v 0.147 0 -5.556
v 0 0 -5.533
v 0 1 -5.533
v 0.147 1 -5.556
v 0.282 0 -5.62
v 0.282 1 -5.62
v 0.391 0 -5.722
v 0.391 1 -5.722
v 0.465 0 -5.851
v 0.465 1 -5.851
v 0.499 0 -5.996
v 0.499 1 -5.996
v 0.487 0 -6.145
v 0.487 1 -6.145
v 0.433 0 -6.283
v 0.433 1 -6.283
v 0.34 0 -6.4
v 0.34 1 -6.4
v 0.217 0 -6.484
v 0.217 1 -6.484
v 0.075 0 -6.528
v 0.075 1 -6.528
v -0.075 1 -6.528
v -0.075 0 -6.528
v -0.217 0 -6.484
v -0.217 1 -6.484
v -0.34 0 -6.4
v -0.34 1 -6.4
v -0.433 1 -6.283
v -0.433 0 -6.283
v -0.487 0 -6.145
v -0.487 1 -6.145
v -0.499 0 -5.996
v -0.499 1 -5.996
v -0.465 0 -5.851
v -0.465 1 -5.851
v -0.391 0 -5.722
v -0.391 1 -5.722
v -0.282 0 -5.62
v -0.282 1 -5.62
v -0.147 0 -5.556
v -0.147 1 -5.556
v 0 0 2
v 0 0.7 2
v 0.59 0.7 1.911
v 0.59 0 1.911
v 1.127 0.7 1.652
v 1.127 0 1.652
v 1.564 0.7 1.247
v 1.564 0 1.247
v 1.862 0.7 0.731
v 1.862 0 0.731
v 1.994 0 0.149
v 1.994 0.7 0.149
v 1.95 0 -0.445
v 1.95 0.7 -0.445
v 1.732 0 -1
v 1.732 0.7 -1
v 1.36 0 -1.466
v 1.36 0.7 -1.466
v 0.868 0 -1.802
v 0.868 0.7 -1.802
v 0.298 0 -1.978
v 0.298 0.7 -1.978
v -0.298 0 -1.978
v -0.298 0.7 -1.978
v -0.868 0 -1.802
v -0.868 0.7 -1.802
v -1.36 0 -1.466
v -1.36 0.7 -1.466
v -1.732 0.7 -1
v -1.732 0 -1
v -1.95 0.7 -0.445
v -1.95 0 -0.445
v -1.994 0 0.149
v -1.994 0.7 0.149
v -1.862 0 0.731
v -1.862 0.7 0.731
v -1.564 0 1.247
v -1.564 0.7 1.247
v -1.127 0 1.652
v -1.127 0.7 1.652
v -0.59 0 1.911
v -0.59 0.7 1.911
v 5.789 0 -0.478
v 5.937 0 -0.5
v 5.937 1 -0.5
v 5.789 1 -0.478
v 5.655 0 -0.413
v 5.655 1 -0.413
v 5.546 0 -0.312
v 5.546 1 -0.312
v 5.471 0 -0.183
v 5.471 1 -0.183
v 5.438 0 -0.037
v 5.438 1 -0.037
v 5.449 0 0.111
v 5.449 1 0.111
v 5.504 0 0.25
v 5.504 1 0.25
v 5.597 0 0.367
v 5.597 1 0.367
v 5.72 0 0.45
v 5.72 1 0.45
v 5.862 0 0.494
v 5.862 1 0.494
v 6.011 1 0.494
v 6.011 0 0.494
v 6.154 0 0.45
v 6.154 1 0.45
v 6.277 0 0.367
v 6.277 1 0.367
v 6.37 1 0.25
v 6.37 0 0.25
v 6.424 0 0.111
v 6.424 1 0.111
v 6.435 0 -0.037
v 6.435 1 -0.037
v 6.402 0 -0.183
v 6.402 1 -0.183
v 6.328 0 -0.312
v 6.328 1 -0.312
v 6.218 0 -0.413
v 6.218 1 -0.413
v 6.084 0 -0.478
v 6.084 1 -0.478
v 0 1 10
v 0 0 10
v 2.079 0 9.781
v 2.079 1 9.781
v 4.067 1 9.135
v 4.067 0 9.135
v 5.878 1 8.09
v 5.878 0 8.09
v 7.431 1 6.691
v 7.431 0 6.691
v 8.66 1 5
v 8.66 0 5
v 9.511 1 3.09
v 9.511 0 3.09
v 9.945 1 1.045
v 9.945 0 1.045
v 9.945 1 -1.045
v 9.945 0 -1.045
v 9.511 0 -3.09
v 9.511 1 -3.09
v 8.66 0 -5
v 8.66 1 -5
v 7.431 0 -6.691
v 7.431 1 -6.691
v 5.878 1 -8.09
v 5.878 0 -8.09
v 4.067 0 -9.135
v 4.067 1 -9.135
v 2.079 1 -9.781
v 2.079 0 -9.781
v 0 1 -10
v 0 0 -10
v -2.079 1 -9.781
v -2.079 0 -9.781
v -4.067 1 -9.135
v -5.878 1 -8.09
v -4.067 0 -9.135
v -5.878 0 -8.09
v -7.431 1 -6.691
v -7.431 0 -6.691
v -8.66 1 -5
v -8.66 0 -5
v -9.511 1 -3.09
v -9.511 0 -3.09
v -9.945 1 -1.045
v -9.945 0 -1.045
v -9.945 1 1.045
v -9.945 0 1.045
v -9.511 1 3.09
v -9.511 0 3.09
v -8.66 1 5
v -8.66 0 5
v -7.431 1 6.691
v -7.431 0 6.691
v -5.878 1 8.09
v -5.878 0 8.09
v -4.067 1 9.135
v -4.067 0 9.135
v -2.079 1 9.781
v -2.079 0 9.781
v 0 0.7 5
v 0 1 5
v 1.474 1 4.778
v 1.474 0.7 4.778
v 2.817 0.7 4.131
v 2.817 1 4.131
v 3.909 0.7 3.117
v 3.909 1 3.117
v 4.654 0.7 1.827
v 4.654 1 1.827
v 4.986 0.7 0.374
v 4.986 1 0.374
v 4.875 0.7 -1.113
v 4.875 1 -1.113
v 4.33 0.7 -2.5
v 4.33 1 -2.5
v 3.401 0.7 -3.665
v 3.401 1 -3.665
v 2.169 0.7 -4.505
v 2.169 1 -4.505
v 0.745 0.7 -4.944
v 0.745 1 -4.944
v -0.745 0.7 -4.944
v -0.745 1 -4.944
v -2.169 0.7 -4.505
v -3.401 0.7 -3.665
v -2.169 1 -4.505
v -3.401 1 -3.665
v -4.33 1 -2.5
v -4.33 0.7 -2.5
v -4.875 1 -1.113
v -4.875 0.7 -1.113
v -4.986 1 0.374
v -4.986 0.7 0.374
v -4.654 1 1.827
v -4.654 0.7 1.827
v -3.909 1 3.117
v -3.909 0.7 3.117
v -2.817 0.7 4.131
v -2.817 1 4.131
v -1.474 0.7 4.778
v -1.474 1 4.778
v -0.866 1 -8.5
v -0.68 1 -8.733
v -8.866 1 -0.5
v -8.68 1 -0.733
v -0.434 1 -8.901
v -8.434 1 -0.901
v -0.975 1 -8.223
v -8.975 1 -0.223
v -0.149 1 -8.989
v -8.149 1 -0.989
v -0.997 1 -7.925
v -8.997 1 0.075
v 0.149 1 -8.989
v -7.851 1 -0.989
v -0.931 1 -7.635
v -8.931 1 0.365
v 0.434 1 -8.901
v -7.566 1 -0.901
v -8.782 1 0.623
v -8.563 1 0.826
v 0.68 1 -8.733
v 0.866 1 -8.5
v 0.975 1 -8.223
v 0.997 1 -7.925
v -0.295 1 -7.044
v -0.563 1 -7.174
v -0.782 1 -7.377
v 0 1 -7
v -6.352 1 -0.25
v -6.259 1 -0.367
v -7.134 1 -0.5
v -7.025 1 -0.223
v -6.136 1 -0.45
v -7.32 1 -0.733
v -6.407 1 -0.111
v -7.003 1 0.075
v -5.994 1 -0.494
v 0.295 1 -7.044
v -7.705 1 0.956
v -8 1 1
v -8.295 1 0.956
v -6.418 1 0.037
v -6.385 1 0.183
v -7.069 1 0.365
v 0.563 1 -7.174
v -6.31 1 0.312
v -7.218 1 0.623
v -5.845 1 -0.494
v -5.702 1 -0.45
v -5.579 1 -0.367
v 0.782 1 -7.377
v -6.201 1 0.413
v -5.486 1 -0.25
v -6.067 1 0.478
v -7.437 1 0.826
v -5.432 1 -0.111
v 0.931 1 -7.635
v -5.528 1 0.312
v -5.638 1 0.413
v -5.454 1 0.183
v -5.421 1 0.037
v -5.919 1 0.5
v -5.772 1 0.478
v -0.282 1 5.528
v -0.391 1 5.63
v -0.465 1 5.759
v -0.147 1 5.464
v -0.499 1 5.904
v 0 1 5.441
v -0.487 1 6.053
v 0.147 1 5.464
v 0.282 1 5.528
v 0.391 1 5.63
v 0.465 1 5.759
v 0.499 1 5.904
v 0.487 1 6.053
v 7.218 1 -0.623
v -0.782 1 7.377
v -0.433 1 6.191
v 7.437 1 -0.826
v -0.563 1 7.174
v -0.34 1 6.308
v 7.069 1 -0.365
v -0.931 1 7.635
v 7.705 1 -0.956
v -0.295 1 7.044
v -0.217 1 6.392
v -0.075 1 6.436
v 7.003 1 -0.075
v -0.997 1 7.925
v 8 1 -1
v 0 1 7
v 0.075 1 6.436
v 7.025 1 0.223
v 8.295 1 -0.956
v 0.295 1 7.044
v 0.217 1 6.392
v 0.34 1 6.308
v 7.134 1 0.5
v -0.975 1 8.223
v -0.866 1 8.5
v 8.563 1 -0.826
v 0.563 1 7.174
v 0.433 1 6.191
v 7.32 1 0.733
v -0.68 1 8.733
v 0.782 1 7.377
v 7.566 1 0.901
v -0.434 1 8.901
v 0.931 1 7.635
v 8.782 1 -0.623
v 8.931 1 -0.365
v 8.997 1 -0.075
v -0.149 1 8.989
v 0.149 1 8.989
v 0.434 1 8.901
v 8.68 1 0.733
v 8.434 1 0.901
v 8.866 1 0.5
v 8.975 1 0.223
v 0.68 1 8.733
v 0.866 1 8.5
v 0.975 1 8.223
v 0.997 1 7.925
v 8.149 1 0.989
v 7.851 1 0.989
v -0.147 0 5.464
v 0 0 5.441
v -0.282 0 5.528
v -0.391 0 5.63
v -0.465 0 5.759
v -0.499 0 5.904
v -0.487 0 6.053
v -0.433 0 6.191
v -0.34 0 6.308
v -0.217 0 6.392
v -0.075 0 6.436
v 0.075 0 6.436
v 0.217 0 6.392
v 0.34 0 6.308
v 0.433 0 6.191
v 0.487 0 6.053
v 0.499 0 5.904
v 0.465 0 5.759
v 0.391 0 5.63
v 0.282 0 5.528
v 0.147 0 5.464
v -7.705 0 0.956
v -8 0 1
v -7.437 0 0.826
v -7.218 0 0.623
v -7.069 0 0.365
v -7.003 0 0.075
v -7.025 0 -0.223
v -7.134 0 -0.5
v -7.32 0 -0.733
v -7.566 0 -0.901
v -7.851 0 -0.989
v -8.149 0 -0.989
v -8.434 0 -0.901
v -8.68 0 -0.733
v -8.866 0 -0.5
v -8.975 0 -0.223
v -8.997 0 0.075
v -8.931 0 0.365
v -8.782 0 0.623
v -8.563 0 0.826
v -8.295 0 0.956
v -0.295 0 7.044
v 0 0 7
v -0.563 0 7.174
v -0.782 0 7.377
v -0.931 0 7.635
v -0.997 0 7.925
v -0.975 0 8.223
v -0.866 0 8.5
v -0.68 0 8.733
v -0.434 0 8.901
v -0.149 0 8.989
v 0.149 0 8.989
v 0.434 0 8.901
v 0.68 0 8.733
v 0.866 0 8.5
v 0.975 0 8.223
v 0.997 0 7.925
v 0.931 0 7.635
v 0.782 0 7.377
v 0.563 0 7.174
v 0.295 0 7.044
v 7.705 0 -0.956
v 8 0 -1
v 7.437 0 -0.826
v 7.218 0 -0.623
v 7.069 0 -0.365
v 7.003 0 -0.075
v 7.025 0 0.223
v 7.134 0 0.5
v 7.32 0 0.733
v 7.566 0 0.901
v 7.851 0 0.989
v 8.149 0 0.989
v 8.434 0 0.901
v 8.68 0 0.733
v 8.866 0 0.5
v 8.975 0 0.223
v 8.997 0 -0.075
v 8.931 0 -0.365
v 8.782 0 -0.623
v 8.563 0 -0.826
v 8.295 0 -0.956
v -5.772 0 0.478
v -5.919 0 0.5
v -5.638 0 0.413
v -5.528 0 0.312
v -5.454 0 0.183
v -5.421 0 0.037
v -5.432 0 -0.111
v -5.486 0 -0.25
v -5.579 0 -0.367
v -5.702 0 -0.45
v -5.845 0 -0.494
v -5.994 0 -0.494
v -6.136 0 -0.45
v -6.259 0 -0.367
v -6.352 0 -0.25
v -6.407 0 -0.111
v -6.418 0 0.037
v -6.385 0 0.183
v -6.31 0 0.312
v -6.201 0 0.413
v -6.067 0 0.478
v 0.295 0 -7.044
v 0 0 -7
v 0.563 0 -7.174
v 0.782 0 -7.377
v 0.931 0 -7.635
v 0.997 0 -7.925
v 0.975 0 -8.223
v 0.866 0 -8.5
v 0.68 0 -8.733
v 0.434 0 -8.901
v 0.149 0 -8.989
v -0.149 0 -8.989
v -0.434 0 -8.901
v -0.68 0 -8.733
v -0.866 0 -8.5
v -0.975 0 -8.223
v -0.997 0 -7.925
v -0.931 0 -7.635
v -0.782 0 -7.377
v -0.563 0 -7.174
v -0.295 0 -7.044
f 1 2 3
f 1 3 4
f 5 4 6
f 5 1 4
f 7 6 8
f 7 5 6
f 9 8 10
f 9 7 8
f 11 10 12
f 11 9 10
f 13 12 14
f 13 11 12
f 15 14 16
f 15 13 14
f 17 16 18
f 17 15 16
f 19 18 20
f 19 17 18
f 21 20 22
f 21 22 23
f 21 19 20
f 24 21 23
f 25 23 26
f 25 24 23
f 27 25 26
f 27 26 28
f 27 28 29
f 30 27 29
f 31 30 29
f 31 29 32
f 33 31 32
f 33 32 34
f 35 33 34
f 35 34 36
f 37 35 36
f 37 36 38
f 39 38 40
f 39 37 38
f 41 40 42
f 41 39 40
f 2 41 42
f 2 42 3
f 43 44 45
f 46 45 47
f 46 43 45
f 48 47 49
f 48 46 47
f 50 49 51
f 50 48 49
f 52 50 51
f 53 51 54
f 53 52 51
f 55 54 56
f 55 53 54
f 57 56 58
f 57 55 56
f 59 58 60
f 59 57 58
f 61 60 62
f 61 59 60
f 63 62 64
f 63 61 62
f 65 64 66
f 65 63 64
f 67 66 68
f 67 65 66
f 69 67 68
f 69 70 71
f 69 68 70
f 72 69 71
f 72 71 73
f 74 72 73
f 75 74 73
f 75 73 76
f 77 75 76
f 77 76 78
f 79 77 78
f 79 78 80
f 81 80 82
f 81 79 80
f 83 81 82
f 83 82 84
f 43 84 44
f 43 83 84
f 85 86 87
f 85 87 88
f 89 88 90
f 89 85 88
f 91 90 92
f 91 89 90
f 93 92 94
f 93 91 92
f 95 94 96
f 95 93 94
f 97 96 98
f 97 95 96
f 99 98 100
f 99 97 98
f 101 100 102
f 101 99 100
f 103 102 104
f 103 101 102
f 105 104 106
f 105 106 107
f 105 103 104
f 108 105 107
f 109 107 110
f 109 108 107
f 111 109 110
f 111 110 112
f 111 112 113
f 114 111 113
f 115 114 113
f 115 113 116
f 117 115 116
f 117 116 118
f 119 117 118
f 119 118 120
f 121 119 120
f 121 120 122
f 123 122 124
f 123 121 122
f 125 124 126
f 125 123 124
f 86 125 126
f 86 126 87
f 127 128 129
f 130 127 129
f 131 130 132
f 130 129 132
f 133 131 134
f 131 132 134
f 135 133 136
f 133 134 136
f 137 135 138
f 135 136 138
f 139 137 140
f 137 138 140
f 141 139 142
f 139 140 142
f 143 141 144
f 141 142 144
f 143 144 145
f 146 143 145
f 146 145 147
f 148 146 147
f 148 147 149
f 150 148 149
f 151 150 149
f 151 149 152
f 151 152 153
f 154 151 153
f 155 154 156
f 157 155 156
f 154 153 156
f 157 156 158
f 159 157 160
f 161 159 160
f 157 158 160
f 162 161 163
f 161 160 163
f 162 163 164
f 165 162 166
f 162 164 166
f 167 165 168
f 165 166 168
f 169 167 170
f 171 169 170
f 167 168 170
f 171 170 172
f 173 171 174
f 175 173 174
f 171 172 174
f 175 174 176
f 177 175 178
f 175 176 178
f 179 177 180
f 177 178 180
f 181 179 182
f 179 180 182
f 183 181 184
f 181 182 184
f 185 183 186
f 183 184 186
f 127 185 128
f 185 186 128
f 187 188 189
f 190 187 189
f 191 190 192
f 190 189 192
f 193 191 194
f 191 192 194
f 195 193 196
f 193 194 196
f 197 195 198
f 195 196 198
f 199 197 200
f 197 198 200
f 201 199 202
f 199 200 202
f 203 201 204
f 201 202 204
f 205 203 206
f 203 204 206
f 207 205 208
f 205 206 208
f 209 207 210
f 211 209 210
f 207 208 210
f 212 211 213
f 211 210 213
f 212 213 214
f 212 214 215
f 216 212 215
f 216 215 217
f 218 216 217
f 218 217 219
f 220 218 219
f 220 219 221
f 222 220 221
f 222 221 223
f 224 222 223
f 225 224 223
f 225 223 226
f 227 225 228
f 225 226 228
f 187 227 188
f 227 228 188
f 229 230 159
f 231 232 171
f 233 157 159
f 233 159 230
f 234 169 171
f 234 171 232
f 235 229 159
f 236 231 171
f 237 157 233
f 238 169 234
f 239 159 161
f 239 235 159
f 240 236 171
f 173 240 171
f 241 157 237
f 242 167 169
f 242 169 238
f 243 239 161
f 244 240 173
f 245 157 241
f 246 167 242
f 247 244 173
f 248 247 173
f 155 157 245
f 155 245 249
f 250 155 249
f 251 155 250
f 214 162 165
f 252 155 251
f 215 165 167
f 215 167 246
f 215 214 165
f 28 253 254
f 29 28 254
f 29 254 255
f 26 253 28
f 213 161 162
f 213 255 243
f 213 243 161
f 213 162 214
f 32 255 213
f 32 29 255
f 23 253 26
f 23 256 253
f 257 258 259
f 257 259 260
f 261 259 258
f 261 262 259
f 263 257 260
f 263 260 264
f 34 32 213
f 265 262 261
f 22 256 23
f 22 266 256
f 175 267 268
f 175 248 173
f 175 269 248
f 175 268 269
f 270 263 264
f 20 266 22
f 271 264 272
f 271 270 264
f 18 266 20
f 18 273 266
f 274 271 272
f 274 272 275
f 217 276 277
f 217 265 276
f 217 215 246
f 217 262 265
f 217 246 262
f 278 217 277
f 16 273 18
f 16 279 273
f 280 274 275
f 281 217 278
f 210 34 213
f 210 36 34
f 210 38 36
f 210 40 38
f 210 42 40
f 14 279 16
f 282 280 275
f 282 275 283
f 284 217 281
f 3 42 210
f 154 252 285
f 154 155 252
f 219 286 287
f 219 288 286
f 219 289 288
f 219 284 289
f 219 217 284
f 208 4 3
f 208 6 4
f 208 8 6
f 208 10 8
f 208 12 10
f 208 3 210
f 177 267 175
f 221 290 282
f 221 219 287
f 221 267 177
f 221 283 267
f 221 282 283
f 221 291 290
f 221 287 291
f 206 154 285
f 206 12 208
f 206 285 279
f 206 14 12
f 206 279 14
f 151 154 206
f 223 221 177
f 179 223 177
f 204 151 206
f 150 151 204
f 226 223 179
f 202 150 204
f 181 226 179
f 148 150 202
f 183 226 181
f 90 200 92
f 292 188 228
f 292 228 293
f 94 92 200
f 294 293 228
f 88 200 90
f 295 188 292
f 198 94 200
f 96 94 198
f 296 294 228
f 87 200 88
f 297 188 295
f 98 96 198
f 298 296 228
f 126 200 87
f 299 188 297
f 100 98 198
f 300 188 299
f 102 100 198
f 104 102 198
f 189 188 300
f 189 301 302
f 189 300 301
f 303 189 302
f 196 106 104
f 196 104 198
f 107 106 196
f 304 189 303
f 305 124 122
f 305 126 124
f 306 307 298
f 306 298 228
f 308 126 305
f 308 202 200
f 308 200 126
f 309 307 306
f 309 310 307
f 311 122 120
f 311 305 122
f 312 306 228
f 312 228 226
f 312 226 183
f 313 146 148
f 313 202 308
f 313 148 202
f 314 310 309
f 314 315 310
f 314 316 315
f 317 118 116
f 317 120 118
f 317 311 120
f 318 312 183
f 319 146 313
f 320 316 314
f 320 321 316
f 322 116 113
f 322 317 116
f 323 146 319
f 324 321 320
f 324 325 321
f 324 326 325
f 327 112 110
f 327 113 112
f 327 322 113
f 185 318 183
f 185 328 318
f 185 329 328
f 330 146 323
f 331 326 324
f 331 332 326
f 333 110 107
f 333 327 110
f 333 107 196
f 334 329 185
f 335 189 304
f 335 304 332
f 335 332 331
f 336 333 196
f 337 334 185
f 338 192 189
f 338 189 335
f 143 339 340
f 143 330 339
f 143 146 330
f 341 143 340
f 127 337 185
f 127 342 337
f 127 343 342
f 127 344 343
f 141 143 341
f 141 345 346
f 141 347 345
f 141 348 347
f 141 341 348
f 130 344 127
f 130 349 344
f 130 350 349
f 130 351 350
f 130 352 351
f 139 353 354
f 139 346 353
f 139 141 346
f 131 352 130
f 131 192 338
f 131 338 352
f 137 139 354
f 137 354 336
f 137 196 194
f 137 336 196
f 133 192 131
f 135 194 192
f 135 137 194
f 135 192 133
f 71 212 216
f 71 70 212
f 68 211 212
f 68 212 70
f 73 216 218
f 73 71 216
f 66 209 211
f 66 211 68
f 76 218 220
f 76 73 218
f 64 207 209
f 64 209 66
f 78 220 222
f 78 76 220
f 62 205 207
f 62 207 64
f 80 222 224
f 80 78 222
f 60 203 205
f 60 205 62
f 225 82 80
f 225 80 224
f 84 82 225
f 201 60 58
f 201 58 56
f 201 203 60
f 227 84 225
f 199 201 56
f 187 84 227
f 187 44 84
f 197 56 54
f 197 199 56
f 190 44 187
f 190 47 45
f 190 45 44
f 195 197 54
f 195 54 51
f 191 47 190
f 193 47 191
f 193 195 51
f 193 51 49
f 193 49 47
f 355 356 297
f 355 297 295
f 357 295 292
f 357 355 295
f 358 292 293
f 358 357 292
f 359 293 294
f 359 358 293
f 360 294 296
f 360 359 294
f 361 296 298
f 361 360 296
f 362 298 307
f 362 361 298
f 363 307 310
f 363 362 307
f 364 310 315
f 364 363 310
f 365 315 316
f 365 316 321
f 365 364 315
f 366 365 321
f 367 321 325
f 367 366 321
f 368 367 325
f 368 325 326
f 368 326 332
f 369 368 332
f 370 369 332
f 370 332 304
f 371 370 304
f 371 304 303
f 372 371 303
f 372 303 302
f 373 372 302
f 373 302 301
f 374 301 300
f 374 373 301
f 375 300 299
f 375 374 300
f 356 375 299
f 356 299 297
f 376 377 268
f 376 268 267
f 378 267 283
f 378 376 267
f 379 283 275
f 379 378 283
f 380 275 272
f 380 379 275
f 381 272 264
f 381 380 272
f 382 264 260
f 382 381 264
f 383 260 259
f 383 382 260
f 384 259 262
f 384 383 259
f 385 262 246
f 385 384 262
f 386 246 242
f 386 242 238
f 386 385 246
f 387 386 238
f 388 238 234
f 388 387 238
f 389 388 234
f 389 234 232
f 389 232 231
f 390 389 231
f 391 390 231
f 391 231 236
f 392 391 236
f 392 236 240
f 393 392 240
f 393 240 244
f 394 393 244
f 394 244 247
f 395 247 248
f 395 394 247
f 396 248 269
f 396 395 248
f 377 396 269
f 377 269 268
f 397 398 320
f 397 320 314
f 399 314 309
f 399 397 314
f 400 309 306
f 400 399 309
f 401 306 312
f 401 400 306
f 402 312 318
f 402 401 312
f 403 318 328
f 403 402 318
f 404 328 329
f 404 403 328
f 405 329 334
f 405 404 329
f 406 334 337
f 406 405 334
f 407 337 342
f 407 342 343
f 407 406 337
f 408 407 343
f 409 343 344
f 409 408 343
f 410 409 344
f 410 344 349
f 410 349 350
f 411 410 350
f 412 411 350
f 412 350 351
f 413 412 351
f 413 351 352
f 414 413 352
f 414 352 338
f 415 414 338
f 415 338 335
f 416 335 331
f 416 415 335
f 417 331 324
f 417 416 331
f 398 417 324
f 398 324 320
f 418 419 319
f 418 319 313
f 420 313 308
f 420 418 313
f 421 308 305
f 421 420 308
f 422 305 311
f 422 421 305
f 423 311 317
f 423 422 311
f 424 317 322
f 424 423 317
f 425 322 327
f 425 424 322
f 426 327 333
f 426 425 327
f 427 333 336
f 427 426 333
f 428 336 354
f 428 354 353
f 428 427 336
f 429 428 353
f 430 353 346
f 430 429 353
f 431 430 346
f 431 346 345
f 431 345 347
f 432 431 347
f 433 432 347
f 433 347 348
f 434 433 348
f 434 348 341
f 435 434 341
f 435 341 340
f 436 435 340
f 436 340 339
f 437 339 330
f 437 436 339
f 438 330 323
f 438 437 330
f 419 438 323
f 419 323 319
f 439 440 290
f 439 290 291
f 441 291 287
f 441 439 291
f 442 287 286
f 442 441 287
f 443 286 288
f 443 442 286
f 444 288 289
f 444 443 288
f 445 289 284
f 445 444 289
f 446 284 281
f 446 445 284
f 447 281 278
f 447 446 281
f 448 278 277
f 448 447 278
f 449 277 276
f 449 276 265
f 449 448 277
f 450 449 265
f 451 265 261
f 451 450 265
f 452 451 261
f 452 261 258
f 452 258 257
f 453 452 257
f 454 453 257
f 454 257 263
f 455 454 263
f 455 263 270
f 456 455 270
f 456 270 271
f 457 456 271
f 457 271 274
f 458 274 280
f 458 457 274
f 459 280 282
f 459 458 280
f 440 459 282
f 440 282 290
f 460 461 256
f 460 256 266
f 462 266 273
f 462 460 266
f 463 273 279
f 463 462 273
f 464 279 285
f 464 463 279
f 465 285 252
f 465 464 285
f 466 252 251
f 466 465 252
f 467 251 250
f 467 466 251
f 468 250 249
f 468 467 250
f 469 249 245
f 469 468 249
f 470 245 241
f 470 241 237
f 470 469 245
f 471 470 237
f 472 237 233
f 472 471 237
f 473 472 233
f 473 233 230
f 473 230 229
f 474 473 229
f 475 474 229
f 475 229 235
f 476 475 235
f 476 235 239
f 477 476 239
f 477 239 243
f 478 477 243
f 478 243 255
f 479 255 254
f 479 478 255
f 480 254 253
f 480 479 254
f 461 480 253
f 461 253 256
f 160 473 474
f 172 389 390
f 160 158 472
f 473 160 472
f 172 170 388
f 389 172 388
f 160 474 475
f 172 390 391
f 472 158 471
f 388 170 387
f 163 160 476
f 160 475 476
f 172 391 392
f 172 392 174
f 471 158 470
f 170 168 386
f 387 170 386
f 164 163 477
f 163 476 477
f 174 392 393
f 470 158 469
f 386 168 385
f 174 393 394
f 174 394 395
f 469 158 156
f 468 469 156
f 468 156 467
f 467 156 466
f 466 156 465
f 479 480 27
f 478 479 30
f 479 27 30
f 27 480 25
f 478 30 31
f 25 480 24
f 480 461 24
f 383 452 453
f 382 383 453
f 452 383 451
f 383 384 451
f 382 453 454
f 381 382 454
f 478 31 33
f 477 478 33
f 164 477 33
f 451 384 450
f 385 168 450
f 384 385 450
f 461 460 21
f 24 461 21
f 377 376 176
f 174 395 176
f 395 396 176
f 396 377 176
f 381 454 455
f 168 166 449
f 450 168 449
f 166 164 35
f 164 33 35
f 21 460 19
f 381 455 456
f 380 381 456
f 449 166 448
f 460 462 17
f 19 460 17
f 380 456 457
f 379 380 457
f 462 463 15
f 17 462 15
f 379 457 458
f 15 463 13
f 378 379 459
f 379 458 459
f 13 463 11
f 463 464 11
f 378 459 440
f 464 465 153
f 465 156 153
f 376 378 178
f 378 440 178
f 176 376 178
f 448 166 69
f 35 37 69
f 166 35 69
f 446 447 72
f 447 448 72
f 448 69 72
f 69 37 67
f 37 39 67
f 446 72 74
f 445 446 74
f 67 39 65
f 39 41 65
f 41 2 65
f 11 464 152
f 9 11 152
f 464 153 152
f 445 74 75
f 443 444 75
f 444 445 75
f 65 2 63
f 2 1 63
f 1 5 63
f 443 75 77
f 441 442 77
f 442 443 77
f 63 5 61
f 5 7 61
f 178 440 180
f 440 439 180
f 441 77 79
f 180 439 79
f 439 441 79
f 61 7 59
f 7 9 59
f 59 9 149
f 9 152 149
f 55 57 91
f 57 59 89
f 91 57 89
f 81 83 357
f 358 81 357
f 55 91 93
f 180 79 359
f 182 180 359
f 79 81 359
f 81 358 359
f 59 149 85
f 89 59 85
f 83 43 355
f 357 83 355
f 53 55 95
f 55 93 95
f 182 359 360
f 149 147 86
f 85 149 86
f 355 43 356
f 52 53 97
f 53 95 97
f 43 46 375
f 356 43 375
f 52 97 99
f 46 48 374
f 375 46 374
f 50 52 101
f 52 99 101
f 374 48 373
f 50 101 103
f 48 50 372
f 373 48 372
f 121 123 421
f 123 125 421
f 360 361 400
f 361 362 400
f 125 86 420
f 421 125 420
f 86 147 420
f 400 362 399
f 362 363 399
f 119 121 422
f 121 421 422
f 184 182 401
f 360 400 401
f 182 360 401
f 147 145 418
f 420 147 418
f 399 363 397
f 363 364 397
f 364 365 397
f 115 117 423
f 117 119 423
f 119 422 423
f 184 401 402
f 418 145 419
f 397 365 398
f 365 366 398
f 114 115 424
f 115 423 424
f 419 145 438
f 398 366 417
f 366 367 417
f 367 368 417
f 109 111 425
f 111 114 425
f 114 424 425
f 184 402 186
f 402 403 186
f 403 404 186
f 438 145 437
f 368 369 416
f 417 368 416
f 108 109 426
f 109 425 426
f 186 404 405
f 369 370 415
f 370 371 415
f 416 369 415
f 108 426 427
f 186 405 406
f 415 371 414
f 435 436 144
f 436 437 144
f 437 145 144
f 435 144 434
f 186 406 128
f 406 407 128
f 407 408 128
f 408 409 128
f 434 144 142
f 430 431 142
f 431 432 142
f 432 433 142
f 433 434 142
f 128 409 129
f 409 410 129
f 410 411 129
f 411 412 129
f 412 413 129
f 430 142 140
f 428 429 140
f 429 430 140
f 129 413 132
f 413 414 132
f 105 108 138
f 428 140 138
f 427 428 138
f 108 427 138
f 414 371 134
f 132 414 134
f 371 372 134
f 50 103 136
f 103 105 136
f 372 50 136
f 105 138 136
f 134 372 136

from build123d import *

# Parameters (mm, degrees)
SKETCH1_R           = 10
SKETCH1_R_2         = 2
SKETCH1_R_3         = 1
SKETCH1_R_4         = 0.5
BOSS_EXTRUDE1_DEPTH = 1
SKETCH2_R           = 5
CUT_EXTRUDE1_DEPTH  = 0.3


with BuildPart() as part:
    # Sketch1 → Boss-Extrude1 (new body)
    with BuildSketch(Plane(origin=(0, 0, 0), x_dir=(1, 0, 0), z_dir=(0, 1, 0))):
        with Locations(Location((0, 0, 0), (0, 0, 270))):  # turned: the seam where the file's is
            Circle(SKETCH1_R)
        with Locations(Location((0, 0, 0), (0, 0, 270))):  # turned: the seam where the file's is
            Circle(SKETCH1_R_2, mode=Mode.SUBTRACT)
        with Locations(Location((-8, 0, 0), (0, 0, 270))):  # turned: the seam where the file's is
            Circle(SKETCH1_R_3, mode=Mode.SUBTRACT)
        with Locations(Location((-5.919172613, 0, 0), (0, 0, 270))):  # turned: the seam where the file's is
            Circle(SKETCH1_R_4, mode=Mode.SUBTRACT)
        with Locations(Location((0, -5.941415712, 0), (0, 0, 90))):  # turned: the seam where the file's is
            Circle(SKETCH1_R_4, mode=Mode.SUBTRACT)
        with Locations(Location((0, -8, 0), (0, 0, 90))):  # turned: the seam where the file's is
            Circle(SKETCH1_R_3, mode=Mode.SUBTRACT)
        with Locations(Location((5.936823246, 0, 0), (0, 0, 90))):  # turned: the seam where the file's is
            Circle(SKETCH1_R_4, mode=Mode.SUBTRACT)
        with Locations(Location((8, 0, 0), (0, 0, 90))):  # turned: the seam where the file's is
            Circle(SKETCH1_R_3, mode=Mode.SUBTRACT)
        with Locations(Location((0, 6.0333524, 0), (0, 0, 270))):  # turned: the seam where the file's is
            Circle(SKETCH1_R_4, mode=Mode.SUBTRACT)
        with Locations(Location((0, 8, 0), (0, 0, 270))):  # turned: the seam where the file's is
            Circle(SKETCH1_R_3, mode=Mode.SUBTRACT)
    extrude(amount=BOSS_EXTRUDE1_DEPTH)

    # Sketch2 → Cut-Extrude1 (cut)
    with BuildSketch(Plane(origin=(0, 1, 0), x_dir=(1, 0, 0), z_dir=(0, 1, 0))):
        with Locations(Location((0, 0, 0), (0, 0, 270))):  # turned: the seam where the file's is
            Circle(SKETCH2_R)
    extrude(amount=-CUT_EXTRUDE1_DEPTH, mode=Mode.SUBTRACT)


solid = part.part
